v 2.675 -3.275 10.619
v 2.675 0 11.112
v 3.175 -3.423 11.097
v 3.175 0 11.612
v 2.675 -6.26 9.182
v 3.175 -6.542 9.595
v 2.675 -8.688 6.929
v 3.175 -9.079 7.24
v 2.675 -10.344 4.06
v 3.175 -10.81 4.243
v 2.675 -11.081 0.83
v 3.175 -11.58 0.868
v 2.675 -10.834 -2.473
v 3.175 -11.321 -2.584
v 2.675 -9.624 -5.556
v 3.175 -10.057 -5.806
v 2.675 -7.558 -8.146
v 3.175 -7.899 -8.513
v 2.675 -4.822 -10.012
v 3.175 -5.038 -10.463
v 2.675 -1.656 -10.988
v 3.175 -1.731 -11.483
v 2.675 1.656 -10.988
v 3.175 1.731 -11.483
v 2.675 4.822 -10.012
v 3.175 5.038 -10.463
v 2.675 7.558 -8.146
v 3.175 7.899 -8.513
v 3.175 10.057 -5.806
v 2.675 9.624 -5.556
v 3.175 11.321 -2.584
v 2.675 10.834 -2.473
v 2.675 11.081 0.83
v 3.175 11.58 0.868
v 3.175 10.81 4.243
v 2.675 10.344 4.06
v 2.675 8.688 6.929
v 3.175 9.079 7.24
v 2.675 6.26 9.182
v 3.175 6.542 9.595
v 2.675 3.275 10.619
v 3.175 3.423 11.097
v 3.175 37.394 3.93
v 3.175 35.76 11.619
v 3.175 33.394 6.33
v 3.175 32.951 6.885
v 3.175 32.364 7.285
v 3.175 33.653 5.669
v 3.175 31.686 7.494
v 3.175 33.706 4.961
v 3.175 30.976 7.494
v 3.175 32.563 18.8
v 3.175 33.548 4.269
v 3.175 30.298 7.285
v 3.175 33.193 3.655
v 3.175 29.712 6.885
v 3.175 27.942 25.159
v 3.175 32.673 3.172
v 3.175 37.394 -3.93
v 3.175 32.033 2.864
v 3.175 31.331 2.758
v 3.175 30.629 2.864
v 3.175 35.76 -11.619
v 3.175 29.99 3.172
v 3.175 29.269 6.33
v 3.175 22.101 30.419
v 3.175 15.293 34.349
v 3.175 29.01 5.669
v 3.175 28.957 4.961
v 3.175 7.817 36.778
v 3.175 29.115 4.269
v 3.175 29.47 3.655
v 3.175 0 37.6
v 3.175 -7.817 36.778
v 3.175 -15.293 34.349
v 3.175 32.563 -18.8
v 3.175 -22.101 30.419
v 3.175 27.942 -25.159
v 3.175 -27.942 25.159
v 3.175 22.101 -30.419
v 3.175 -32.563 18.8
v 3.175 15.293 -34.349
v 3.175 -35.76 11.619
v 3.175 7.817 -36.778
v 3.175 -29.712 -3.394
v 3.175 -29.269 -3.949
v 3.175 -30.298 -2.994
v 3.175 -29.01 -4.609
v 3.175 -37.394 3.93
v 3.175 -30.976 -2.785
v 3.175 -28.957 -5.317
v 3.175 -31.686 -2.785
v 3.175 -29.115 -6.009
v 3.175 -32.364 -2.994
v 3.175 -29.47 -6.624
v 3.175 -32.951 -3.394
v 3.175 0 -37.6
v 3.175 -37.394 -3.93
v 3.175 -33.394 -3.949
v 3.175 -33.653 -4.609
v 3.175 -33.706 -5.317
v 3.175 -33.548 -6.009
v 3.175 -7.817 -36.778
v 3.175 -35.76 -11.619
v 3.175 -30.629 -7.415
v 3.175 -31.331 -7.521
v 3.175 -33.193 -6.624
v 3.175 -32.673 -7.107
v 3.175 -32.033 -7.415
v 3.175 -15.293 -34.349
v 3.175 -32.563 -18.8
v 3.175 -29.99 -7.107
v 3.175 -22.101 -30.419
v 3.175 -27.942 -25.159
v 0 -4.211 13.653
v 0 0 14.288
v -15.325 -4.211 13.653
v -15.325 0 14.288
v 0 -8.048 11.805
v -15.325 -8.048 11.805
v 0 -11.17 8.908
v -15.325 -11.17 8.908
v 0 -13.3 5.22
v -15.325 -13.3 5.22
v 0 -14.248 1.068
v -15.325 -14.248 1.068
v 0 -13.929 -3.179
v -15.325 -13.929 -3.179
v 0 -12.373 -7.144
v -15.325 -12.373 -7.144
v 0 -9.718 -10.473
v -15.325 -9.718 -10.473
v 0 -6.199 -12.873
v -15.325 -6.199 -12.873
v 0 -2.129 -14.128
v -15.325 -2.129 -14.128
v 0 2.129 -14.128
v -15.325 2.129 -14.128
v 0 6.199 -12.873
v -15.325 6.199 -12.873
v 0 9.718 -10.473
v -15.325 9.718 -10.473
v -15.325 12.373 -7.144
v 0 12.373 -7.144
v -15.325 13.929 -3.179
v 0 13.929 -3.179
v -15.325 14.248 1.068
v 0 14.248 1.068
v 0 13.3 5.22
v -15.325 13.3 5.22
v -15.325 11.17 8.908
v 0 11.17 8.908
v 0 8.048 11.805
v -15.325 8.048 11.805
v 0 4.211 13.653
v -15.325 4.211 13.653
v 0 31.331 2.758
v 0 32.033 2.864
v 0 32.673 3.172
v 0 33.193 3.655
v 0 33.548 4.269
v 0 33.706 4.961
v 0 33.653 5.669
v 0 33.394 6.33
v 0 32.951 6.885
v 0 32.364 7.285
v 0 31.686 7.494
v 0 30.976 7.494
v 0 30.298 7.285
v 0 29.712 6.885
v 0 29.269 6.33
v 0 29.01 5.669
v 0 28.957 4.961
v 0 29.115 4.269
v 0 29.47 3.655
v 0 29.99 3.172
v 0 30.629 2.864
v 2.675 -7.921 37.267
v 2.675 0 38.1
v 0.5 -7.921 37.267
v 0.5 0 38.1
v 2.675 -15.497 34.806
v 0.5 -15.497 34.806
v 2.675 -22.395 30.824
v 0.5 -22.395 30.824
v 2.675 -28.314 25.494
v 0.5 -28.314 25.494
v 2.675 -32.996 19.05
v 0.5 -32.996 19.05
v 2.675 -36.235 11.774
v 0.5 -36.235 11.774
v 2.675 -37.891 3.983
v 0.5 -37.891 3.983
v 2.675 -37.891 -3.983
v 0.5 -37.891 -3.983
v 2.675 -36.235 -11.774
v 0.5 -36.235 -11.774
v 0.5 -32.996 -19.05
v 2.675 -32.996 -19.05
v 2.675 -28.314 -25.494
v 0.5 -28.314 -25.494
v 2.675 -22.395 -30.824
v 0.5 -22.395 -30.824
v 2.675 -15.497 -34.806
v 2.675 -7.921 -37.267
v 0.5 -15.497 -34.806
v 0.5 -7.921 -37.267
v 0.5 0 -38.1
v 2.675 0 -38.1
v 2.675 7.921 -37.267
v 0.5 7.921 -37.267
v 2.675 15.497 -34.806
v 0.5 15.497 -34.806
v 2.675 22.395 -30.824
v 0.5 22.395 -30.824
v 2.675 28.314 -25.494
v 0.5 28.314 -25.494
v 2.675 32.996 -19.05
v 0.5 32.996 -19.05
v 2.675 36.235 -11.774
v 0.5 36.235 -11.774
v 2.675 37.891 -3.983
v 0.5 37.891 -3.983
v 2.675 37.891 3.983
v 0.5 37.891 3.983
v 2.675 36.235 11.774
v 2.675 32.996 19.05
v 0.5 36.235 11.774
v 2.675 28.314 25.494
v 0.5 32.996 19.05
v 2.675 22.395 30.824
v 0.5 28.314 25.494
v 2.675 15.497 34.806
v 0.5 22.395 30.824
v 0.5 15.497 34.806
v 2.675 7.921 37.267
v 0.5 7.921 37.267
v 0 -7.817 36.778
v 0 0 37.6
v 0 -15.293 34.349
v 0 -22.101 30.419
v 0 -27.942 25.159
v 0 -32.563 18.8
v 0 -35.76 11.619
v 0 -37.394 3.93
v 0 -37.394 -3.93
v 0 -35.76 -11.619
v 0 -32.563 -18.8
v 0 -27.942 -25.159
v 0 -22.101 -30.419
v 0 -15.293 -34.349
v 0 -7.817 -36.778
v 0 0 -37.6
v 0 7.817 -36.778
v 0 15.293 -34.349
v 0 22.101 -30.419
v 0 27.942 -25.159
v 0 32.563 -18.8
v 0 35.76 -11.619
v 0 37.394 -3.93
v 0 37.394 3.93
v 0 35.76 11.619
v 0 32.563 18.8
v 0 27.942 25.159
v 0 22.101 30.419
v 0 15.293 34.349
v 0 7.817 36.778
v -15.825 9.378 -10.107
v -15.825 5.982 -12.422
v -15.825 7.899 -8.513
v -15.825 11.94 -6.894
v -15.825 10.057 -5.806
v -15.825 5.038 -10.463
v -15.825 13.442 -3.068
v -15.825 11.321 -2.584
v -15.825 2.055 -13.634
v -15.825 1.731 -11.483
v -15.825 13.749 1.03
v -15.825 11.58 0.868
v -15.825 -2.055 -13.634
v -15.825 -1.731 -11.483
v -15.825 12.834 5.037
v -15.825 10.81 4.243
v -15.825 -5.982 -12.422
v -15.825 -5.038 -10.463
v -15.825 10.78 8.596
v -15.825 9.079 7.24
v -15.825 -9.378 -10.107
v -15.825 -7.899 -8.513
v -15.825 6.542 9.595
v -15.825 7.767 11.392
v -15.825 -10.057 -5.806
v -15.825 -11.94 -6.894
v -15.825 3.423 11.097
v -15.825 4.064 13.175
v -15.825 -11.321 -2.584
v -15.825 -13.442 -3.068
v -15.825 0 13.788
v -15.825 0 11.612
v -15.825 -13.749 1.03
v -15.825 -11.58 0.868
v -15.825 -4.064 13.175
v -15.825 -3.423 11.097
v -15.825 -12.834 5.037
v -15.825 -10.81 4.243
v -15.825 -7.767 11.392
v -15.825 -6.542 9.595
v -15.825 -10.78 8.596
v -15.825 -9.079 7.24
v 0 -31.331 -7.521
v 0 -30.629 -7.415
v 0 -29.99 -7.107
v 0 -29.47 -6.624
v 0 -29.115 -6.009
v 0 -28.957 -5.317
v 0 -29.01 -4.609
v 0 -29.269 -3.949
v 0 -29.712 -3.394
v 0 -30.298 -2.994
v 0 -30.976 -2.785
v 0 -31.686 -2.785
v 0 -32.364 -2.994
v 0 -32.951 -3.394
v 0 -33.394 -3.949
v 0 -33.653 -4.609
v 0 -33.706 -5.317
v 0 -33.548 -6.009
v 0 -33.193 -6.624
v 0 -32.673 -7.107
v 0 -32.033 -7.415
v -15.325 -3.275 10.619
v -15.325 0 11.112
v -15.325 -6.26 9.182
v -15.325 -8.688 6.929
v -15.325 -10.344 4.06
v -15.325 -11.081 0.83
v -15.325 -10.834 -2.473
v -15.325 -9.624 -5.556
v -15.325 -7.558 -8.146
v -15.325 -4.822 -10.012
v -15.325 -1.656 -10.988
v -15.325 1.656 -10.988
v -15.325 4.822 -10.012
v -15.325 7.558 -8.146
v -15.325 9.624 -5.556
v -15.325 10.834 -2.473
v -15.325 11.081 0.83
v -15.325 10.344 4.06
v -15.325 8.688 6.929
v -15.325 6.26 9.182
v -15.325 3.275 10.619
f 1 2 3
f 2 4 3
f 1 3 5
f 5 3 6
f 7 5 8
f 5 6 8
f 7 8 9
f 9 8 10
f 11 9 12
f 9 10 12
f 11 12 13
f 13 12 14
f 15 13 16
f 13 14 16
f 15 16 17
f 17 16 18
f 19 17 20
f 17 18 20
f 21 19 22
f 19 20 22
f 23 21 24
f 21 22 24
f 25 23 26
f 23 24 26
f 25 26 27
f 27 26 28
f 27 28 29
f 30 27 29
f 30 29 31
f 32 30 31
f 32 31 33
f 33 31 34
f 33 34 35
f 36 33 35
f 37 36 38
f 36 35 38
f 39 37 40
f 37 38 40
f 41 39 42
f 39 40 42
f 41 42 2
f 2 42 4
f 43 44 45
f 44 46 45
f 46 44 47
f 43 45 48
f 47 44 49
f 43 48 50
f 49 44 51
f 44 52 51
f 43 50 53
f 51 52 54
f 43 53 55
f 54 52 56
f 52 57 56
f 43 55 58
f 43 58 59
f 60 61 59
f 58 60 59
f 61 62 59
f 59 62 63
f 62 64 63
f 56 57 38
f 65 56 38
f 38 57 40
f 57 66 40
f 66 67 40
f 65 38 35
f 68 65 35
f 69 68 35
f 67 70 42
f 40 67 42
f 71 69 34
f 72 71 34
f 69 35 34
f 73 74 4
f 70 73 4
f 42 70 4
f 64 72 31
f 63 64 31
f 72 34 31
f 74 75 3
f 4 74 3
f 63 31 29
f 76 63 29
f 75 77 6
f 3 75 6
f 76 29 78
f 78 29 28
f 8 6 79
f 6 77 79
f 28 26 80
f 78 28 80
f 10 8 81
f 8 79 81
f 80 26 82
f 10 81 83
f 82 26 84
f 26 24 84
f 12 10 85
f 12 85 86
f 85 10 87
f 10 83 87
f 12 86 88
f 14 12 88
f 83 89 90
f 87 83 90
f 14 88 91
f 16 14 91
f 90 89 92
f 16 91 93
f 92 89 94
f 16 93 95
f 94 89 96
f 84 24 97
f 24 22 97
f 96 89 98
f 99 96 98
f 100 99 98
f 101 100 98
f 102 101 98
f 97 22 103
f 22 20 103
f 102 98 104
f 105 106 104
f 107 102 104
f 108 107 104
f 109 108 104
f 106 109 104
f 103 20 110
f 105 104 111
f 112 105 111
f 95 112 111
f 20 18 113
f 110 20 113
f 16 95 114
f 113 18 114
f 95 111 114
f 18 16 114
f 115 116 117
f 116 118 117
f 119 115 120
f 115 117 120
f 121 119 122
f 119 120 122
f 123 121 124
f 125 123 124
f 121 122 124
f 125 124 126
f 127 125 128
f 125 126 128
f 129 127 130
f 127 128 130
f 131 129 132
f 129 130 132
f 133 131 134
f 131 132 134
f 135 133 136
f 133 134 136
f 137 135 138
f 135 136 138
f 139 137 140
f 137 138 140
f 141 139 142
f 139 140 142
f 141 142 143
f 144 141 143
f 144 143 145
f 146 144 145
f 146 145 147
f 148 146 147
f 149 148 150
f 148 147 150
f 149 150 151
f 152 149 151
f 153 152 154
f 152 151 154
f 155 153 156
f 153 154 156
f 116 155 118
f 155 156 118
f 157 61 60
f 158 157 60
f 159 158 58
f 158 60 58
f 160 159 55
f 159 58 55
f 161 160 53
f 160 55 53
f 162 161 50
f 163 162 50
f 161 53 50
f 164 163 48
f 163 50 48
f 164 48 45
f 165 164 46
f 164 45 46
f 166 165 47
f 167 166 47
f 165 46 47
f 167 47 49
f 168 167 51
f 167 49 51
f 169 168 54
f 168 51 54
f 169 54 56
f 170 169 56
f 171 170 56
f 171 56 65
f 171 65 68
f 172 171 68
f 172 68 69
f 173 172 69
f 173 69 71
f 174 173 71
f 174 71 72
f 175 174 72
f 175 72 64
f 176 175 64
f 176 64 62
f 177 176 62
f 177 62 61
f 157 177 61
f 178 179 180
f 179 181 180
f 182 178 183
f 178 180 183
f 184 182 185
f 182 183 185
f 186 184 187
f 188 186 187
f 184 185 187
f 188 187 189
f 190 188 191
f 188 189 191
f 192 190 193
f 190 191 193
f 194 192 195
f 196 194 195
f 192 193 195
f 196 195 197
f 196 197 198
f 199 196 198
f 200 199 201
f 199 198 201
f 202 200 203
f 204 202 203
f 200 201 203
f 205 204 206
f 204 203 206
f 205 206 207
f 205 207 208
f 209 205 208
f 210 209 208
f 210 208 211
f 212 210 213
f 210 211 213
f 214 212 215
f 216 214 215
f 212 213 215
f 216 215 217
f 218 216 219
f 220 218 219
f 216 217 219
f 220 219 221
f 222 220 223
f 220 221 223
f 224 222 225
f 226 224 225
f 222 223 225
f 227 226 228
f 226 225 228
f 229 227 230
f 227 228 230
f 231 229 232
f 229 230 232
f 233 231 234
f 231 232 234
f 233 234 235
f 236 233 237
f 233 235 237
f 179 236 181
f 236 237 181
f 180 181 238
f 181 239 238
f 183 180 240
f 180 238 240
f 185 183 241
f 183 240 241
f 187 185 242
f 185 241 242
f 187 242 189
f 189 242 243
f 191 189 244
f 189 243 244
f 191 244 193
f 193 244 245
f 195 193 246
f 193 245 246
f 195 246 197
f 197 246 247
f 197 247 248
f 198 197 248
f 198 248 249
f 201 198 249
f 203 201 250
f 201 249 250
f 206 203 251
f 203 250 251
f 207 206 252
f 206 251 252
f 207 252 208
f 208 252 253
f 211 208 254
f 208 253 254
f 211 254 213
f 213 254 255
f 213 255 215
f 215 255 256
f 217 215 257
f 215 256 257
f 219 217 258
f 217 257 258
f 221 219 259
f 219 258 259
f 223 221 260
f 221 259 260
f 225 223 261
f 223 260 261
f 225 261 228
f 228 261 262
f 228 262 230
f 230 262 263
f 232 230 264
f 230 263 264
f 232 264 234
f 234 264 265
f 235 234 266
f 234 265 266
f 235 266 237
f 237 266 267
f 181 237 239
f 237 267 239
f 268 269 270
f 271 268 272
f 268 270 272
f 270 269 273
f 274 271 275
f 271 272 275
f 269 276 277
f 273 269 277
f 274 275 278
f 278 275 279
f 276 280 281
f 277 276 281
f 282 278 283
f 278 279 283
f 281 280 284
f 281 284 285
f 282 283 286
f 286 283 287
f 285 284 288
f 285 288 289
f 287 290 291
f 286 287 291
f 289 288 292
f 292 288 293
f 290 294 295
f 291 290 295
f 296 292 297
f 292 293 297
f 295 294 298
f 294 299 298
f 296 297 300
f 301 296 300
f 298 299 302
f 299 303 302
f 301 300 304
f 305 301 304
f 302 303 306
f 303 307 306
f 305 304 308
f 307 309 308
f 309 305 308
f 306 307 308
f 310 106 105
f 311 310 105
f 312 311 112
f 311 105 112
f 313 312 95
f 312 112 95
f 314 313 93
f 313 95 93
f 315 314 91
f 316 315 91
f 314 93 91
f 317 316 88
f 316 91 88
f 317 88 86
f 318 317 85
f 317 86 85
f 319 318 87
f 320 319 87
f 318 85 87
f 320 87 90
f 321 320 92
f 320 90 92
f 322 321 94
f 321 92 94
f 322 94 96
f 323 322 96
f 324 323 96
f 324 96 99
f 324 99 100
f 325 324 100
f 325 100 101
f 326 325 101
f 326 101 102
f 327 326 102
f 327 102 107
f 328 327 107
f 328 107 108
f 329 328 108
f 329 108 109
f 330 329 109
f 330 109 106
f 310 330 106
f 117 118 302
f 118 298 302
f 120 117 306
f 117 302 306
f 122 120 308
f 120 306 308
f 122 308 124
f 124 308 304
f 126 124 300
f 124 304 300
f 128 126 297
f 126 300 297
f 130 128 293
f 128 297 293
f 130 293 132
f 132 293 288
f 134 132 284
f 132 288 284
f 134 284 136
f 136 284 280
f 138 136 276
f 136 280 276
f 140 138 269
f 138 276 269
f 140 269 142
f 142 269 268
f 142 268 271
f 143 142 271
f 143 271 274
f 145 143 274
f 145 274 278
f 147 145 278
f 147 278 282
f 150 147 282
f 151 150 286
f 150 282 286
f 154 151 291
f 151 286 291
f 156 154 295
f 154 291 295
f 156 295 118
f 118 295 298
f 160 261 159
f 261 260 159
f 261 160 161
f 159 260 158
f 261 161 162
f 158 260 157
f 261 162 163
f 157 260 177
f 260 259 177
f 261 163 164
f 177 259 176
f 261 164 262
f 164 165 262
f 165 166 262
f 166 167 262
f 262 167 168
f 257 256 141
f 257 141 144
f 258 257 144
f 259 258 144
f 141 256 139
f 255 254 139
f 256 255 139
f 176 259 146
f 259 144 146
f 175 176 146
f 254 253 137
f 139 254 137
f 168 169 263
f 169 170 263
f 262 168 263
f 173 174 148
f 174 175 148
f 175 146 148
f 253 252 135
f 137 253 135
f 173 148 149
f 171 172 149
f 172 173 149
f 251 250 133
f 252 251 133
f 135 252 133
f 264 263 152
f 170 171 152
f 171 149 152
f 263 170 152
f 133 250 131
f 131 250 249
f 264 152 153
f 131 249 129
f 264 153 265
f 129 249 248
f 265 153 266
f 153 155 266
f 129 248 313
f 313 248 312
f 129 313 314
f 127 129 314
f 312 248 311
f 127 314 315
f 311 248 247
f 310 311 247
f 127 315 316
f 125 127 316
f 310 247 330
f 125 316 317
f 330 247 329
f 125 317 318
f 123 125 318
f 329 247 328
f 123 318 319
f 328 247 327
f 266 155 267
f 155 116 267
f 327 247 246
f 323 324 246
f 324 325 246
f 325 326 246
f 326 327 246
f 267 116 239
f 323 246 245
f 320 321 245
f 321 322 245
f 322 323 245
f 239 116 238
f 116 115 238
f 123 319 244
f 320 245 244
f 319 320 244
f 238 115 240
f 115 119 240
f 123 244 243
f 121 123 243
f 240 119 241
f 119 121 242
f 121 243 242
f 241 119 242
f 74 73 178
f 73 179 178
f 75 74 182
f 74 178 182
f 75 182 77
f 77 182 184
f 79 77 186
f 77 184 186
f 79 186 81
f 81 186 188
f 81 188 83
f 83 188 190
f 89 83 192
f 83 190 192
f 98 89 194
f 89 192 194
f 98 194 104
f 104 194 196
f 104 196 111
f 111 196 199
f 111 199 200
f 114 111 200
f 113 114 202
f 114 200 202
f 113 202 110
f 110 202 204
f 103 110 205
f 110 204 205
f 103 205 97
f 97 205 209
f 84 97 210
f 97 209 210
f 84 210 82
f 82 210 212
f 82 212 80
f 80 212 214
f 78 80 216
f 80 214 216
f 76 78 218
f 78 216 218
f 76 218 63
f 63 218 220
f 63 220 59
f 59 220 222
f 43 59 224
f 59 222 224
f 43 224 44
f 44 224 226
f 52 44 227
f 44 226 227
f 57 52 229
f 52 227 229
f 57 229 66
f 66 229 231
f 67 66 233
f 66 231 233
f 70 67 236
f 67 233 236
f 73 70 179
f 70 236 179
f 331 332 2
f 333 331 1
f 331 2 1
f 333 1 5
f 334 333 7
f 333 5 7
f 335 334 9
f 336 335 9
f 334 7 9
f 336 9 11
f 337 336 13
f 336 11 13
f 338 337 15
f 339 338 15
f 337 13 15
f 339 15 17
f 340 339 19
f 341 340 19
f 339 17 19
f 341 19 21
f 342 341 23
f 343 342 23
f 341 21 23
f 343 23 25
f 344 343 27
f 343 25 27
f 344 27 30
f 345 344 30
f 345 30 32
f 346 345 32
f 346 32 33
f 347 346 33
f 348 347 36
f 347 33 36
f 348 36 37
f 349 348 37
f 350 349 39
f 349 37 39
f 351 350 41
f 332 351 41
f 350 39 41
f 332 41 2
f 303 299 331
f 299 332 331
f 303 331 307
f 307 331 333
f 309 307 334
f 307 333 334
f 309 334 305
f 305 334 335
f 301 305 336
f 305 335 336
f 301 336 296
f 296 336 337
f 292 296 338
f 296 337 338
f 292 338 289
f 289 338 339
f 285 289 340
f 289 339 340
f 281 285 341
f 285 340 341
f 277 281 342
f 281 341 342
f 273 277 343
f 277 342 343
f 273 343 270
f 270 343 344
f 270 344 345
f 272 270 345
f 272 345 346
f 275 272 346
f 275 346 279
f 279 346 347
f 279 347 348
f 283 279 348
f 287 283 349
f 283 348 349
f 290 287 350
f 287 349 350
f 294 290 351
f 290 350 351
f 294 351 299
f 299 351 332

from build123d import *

# Parameters (mm, degrees)
SKETCH2_R          = 2.38125
CUT_EXTRUDE1_DEPTH = 10


with BuildPart() as part:
    # Sketch1 → Revolve1 (revolve)
    with BuildSketch(Plane.XY, mode=Mode.PRIVATE) as revolve1_sk:
        Polygon((-15.825, 13.7875), (-15.825, 11.6125), (-15.325, 11.1125), (2.675, 11.1125), (3.175, 11.6125), (3.175, 37.6), (2.675, 38.1), (0.5, 38.1), (0, 37.6), (0, 14.2875), (-15.325, 14.2875), align=None)
    revolve(revolve1_sk.sketch.rotate(Axis((0, 0, 0), (1, 0, 0)), 90), axis=Axis((0, 0, 0), (1, 0, 0)))

    # Sketch2 → Cut-Extrude1 (cut)
    with BuildSketch(Plane(origin=(3.175, 0, 0), x_dir=(0, 0, -1), z_dir=(1, 0, 0))):
        with Locations((-5.139303331, 31.331295238)):
            Circle(SKETCH2_R)
        with Locations((5.139303331, -31.331295238)):
            Circle(SKETCH2_R)
    extrude(amount=-CUT_EXTRUDE1_DEPTH, mode=Mode.SUBTRACT)


solid = part.part
